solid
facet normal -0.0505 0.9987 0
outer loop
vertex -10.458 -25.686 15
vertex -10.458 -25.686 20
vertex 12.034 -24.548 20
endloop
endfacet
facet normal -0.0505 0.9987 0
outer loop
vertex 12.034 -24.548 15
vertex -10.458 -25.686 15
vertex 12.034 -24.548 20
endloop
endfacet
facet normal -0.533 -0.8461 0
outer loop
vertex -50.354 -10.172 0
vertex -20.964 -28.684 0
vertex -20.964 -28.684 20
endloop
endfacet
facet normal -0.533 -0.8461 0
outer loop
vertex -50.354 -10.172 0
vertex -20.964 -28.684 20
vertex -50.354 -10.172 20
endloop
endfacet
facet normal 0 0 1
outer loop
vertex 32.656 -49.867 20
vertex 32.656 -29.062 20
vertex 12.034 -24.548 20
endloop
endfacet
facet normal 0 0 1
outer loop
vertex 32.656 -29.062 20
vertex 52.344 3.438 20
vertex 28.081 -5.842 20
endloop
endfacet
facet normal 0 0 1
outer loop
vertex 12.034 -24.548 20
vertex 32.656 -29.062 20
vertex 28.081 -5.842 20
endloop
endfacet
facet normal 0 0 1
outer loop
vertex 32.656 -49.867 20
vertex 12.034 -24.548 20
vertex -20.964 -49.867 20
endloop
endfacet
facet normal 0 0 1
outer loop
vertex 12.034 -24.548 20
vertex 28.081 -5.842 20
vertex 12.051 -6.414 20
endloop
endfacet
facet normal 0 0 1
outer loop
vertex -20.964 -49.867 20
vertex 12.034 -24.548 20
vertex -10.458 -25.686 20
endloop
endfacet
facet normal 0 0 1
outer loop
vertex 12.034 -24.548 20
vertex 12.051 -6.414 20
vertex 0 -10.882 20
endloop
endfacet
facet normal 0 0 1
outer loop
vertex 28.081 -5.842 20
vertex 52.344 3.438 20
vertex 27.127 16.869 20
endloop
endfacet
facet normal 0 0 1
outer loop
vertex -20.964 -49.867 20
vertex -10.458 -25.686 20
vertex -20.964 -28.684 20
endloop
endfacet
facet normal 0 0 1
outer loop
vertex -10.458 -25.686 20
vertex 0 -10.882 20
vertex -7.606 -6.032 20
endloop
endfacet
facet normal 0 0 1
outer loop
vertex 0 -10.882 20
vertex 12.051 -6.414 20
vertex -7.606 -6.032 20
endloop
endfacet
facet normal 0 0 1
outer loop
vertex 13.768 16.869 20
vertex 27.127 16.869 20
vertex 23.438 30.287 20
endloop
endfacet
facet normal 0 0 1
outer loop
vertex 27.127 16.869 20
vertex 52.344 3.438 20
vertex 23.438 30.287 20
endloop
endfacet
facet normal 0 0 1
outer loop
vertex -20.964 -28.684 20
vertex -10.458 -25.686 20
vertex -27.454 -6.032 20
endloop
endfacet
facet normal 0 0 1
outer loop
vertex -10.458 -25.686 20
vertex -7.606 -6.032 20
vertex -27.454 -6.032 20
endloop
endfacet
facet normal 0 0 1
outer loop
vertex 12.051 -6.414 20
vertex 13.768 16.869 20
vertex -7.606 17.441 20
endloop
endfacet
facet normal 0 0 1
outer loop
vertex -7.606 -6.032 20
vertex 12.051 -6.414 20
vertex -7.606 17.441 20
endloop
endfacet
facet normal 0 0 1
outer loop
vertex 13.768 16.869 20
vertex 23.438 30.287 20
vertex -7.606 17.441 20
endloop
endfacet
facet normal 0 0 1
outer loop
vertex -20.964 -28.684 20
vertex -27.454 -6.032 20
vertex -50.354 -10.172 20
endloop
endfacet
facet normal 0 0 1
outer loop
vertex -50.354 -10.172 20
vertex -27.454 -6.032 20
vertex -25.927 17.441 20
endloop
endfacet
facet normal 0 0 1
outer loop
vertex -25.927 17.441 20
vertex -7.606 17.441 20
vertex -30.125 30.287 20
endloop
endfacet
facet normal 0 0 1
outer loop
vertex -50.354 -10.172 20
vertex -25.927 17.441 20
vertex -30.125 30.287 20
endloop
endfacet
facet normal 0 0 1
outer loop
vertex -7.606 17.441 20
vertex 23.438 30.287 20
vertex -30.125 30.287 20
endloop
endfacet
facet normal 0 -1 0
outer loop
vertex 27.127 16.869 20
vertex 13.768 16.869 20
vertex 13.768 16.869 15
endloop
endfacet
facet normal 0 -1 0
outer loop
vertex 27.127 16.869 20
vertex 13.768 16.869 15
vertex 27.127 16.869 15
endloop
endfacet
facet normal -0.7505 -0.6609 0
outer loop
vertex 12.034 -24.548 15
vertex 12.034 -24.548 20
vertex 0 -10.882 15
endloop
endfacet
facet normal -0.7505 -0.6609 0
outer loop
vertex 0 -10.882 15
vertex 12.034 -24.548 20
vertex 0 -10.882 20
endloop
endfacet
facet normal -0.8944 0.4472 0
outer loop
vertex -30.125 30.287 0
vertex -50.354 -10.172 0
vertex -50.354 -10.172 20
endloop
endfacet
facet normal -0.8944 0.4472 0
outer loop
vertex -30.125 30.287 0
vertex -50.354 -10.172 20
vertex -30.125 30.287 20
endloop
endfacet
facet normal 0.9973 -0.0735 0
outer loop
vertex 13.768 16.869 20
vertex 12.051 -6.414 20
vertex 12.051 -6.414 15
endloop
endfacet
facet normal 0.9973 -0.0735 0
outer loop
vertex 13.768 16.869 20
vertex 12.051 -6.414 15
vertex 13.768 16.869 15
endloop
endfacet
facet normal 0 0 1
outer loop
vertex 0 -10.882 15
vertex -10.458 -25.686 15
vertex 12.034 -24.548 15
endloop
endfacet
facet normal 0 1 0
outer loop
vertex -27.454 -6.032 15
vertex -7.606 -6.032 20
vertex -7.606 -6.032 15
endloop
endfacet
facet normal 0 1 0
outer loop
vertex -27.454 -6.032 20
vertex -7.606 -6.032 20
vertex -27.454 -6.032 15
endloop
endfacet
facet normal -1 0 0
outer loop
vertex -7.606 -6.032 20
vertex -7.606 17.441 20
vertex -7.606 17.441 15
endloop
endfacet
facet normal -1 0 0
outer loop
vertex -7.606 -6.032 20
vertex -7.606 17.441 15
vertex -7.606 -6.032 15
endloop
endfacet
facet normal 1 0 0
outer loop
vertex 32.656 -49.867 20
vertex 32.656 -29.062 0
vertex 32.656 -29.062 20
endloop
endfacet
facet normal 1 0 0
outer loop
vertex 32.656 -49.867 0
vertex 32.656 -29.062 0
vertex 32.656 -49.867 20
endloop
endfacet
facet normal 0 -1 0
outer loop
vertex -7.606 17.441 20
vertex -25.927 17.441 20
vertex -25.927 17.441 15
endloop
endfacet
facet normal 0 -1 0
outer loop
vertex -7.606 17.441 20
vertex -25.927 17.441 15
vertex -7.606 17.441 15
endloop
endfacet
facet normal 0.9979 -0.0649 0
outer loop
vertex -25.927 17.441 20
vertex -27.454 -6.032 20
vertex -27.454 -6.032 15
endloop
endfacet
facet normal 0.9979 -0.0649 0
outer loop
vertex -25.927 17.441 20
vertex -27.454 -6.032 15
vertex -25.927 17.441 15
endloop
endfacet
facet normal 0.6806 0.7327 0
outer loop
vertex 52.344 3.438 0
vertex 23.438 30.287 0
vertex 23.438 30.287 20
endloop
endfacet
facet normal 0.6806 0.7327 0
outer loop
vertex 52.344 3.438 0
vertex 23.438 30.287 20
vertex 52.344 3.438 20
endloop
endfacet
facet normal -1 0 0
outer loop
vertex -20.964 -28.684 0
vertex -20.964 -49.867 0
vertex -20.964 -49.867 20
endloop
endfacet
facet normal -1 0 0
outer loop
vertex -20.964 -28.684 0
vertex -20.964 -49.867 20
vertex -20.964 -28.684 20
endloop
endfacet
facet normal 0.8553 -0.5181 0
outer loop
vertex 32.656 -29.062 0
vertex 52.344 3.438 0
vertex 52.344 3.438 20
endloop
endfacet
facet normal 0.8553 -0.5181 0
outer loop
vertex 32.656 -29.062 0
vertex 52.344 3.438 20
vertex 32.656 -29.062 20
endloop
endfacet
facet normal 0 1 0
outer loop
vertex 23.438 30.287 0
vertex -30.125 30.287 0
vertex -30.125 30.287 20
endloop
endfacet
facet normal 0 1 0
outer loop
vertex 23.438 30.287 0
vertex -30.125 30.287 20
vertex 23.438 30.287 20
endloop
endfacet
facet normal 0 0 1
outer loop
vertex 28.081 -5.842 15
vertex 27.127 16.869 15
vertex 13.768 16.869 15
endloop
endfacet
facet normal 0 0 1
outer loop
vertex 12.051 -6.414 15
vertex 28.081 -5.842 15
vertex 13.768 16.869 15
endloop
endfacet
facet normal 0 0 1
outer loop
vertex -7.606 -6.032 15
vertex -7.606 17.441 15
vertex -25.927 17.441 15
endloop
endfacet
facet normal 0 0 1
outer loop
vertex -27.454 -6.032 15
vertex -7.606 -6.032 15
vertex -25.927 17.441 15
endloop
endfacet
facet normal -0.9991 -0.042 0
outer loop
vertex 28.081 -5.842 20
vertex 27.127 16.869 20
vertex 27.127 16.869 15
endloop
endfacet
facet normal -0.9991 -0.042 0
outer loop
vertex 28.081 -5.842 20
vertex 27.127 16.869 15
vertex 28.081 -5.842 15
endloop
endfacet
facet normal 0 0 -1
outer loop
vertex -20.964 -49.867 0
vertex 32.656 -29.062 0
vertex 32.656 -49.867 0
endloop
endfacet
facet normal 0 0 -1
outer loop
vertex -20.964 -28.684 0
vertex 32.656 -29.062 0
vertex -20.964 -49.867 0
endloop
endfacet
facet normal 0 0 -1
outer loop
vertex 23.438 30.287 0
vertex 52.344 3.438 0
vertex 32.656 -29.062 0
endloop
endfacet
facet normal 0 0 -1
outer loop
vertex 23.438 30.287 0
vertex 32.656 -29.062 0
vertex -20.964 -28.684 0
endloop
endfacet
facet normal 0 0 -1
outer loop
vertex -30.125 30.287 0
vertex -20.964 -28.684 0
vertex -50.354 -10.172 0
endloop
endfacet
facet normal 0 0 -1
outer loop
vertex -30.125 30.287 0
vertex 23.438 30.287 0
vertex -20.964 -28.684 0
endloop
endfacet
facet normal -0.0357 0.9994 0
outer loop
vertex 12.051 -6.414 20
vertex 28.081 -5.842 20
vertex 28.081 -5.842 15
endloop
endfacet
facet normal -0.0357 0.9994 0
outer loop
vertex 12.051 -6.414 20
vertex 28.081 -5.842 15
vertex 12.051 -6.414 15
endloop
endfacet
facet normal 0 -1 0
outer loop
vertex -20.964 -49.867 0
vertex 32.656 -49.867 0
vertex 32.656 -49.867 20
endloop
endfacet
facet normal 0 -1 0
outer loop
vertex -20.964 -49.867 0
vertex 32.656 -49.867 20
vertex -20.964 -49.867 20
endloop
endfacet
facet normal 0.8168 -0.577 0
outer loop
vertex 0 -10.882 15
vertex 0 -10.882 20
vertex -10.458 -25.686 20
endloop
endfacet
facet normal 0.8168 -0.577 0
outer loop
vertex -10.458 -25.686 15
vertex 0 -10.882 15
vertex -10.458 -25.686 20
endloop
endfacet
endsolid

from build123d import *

# Parameters (mm, degrees)
PAD_DEPTH       = 20
POCKET_DEPTH    = 5
POCKET001_DEPTH = 5


with BuildPart() as part:
    # Sketch → Pad (new body)
    with BuildSketch(Plane.XY):
        Polygon((-30.124981, 30.287271), (23.4375, 30.287271), (52.34375, 3.437501), (32.656242, -29.0625), (32.656242, -49.867283), (-20.964462, -49.867283), (-20.964462, -28.68358), (-50.354469, -10.171695), align=None)
    extrude(amount=PAD_DEPTH)

    # Sketch001 (on Face10 of Pad) → Pocket (cut)
    with BuildSketch(Plane.XY.offset(20)):
        Polygon((-25.927446, 17.441479), (-7.606405, 17.441479), (-7.606405, -6.032361), (-27.454205, -6.032361), align=None)
        Polygon((13.768158, 16.868948), (27.127254, 16.868948), (28.081469, -5.841516), (12.050557, -6.414047), align=None)
    extrude(amount=-POCKET_DEPTH, mode=Mode.SUBTRACT)

    # Sketch002 (on Face5 of Pocket) → Pocket001 (cut)
    with BuildSketch(Plane.XY.offset(20)):
        Polygon((0, -10.881702), (-10.45758, -25.686424), (12.034194, -24.5476), align=None)
    extrude(amount=-POCKET001_DEPTH, mode=Mode.SUBTRACT)


solid = part.part
